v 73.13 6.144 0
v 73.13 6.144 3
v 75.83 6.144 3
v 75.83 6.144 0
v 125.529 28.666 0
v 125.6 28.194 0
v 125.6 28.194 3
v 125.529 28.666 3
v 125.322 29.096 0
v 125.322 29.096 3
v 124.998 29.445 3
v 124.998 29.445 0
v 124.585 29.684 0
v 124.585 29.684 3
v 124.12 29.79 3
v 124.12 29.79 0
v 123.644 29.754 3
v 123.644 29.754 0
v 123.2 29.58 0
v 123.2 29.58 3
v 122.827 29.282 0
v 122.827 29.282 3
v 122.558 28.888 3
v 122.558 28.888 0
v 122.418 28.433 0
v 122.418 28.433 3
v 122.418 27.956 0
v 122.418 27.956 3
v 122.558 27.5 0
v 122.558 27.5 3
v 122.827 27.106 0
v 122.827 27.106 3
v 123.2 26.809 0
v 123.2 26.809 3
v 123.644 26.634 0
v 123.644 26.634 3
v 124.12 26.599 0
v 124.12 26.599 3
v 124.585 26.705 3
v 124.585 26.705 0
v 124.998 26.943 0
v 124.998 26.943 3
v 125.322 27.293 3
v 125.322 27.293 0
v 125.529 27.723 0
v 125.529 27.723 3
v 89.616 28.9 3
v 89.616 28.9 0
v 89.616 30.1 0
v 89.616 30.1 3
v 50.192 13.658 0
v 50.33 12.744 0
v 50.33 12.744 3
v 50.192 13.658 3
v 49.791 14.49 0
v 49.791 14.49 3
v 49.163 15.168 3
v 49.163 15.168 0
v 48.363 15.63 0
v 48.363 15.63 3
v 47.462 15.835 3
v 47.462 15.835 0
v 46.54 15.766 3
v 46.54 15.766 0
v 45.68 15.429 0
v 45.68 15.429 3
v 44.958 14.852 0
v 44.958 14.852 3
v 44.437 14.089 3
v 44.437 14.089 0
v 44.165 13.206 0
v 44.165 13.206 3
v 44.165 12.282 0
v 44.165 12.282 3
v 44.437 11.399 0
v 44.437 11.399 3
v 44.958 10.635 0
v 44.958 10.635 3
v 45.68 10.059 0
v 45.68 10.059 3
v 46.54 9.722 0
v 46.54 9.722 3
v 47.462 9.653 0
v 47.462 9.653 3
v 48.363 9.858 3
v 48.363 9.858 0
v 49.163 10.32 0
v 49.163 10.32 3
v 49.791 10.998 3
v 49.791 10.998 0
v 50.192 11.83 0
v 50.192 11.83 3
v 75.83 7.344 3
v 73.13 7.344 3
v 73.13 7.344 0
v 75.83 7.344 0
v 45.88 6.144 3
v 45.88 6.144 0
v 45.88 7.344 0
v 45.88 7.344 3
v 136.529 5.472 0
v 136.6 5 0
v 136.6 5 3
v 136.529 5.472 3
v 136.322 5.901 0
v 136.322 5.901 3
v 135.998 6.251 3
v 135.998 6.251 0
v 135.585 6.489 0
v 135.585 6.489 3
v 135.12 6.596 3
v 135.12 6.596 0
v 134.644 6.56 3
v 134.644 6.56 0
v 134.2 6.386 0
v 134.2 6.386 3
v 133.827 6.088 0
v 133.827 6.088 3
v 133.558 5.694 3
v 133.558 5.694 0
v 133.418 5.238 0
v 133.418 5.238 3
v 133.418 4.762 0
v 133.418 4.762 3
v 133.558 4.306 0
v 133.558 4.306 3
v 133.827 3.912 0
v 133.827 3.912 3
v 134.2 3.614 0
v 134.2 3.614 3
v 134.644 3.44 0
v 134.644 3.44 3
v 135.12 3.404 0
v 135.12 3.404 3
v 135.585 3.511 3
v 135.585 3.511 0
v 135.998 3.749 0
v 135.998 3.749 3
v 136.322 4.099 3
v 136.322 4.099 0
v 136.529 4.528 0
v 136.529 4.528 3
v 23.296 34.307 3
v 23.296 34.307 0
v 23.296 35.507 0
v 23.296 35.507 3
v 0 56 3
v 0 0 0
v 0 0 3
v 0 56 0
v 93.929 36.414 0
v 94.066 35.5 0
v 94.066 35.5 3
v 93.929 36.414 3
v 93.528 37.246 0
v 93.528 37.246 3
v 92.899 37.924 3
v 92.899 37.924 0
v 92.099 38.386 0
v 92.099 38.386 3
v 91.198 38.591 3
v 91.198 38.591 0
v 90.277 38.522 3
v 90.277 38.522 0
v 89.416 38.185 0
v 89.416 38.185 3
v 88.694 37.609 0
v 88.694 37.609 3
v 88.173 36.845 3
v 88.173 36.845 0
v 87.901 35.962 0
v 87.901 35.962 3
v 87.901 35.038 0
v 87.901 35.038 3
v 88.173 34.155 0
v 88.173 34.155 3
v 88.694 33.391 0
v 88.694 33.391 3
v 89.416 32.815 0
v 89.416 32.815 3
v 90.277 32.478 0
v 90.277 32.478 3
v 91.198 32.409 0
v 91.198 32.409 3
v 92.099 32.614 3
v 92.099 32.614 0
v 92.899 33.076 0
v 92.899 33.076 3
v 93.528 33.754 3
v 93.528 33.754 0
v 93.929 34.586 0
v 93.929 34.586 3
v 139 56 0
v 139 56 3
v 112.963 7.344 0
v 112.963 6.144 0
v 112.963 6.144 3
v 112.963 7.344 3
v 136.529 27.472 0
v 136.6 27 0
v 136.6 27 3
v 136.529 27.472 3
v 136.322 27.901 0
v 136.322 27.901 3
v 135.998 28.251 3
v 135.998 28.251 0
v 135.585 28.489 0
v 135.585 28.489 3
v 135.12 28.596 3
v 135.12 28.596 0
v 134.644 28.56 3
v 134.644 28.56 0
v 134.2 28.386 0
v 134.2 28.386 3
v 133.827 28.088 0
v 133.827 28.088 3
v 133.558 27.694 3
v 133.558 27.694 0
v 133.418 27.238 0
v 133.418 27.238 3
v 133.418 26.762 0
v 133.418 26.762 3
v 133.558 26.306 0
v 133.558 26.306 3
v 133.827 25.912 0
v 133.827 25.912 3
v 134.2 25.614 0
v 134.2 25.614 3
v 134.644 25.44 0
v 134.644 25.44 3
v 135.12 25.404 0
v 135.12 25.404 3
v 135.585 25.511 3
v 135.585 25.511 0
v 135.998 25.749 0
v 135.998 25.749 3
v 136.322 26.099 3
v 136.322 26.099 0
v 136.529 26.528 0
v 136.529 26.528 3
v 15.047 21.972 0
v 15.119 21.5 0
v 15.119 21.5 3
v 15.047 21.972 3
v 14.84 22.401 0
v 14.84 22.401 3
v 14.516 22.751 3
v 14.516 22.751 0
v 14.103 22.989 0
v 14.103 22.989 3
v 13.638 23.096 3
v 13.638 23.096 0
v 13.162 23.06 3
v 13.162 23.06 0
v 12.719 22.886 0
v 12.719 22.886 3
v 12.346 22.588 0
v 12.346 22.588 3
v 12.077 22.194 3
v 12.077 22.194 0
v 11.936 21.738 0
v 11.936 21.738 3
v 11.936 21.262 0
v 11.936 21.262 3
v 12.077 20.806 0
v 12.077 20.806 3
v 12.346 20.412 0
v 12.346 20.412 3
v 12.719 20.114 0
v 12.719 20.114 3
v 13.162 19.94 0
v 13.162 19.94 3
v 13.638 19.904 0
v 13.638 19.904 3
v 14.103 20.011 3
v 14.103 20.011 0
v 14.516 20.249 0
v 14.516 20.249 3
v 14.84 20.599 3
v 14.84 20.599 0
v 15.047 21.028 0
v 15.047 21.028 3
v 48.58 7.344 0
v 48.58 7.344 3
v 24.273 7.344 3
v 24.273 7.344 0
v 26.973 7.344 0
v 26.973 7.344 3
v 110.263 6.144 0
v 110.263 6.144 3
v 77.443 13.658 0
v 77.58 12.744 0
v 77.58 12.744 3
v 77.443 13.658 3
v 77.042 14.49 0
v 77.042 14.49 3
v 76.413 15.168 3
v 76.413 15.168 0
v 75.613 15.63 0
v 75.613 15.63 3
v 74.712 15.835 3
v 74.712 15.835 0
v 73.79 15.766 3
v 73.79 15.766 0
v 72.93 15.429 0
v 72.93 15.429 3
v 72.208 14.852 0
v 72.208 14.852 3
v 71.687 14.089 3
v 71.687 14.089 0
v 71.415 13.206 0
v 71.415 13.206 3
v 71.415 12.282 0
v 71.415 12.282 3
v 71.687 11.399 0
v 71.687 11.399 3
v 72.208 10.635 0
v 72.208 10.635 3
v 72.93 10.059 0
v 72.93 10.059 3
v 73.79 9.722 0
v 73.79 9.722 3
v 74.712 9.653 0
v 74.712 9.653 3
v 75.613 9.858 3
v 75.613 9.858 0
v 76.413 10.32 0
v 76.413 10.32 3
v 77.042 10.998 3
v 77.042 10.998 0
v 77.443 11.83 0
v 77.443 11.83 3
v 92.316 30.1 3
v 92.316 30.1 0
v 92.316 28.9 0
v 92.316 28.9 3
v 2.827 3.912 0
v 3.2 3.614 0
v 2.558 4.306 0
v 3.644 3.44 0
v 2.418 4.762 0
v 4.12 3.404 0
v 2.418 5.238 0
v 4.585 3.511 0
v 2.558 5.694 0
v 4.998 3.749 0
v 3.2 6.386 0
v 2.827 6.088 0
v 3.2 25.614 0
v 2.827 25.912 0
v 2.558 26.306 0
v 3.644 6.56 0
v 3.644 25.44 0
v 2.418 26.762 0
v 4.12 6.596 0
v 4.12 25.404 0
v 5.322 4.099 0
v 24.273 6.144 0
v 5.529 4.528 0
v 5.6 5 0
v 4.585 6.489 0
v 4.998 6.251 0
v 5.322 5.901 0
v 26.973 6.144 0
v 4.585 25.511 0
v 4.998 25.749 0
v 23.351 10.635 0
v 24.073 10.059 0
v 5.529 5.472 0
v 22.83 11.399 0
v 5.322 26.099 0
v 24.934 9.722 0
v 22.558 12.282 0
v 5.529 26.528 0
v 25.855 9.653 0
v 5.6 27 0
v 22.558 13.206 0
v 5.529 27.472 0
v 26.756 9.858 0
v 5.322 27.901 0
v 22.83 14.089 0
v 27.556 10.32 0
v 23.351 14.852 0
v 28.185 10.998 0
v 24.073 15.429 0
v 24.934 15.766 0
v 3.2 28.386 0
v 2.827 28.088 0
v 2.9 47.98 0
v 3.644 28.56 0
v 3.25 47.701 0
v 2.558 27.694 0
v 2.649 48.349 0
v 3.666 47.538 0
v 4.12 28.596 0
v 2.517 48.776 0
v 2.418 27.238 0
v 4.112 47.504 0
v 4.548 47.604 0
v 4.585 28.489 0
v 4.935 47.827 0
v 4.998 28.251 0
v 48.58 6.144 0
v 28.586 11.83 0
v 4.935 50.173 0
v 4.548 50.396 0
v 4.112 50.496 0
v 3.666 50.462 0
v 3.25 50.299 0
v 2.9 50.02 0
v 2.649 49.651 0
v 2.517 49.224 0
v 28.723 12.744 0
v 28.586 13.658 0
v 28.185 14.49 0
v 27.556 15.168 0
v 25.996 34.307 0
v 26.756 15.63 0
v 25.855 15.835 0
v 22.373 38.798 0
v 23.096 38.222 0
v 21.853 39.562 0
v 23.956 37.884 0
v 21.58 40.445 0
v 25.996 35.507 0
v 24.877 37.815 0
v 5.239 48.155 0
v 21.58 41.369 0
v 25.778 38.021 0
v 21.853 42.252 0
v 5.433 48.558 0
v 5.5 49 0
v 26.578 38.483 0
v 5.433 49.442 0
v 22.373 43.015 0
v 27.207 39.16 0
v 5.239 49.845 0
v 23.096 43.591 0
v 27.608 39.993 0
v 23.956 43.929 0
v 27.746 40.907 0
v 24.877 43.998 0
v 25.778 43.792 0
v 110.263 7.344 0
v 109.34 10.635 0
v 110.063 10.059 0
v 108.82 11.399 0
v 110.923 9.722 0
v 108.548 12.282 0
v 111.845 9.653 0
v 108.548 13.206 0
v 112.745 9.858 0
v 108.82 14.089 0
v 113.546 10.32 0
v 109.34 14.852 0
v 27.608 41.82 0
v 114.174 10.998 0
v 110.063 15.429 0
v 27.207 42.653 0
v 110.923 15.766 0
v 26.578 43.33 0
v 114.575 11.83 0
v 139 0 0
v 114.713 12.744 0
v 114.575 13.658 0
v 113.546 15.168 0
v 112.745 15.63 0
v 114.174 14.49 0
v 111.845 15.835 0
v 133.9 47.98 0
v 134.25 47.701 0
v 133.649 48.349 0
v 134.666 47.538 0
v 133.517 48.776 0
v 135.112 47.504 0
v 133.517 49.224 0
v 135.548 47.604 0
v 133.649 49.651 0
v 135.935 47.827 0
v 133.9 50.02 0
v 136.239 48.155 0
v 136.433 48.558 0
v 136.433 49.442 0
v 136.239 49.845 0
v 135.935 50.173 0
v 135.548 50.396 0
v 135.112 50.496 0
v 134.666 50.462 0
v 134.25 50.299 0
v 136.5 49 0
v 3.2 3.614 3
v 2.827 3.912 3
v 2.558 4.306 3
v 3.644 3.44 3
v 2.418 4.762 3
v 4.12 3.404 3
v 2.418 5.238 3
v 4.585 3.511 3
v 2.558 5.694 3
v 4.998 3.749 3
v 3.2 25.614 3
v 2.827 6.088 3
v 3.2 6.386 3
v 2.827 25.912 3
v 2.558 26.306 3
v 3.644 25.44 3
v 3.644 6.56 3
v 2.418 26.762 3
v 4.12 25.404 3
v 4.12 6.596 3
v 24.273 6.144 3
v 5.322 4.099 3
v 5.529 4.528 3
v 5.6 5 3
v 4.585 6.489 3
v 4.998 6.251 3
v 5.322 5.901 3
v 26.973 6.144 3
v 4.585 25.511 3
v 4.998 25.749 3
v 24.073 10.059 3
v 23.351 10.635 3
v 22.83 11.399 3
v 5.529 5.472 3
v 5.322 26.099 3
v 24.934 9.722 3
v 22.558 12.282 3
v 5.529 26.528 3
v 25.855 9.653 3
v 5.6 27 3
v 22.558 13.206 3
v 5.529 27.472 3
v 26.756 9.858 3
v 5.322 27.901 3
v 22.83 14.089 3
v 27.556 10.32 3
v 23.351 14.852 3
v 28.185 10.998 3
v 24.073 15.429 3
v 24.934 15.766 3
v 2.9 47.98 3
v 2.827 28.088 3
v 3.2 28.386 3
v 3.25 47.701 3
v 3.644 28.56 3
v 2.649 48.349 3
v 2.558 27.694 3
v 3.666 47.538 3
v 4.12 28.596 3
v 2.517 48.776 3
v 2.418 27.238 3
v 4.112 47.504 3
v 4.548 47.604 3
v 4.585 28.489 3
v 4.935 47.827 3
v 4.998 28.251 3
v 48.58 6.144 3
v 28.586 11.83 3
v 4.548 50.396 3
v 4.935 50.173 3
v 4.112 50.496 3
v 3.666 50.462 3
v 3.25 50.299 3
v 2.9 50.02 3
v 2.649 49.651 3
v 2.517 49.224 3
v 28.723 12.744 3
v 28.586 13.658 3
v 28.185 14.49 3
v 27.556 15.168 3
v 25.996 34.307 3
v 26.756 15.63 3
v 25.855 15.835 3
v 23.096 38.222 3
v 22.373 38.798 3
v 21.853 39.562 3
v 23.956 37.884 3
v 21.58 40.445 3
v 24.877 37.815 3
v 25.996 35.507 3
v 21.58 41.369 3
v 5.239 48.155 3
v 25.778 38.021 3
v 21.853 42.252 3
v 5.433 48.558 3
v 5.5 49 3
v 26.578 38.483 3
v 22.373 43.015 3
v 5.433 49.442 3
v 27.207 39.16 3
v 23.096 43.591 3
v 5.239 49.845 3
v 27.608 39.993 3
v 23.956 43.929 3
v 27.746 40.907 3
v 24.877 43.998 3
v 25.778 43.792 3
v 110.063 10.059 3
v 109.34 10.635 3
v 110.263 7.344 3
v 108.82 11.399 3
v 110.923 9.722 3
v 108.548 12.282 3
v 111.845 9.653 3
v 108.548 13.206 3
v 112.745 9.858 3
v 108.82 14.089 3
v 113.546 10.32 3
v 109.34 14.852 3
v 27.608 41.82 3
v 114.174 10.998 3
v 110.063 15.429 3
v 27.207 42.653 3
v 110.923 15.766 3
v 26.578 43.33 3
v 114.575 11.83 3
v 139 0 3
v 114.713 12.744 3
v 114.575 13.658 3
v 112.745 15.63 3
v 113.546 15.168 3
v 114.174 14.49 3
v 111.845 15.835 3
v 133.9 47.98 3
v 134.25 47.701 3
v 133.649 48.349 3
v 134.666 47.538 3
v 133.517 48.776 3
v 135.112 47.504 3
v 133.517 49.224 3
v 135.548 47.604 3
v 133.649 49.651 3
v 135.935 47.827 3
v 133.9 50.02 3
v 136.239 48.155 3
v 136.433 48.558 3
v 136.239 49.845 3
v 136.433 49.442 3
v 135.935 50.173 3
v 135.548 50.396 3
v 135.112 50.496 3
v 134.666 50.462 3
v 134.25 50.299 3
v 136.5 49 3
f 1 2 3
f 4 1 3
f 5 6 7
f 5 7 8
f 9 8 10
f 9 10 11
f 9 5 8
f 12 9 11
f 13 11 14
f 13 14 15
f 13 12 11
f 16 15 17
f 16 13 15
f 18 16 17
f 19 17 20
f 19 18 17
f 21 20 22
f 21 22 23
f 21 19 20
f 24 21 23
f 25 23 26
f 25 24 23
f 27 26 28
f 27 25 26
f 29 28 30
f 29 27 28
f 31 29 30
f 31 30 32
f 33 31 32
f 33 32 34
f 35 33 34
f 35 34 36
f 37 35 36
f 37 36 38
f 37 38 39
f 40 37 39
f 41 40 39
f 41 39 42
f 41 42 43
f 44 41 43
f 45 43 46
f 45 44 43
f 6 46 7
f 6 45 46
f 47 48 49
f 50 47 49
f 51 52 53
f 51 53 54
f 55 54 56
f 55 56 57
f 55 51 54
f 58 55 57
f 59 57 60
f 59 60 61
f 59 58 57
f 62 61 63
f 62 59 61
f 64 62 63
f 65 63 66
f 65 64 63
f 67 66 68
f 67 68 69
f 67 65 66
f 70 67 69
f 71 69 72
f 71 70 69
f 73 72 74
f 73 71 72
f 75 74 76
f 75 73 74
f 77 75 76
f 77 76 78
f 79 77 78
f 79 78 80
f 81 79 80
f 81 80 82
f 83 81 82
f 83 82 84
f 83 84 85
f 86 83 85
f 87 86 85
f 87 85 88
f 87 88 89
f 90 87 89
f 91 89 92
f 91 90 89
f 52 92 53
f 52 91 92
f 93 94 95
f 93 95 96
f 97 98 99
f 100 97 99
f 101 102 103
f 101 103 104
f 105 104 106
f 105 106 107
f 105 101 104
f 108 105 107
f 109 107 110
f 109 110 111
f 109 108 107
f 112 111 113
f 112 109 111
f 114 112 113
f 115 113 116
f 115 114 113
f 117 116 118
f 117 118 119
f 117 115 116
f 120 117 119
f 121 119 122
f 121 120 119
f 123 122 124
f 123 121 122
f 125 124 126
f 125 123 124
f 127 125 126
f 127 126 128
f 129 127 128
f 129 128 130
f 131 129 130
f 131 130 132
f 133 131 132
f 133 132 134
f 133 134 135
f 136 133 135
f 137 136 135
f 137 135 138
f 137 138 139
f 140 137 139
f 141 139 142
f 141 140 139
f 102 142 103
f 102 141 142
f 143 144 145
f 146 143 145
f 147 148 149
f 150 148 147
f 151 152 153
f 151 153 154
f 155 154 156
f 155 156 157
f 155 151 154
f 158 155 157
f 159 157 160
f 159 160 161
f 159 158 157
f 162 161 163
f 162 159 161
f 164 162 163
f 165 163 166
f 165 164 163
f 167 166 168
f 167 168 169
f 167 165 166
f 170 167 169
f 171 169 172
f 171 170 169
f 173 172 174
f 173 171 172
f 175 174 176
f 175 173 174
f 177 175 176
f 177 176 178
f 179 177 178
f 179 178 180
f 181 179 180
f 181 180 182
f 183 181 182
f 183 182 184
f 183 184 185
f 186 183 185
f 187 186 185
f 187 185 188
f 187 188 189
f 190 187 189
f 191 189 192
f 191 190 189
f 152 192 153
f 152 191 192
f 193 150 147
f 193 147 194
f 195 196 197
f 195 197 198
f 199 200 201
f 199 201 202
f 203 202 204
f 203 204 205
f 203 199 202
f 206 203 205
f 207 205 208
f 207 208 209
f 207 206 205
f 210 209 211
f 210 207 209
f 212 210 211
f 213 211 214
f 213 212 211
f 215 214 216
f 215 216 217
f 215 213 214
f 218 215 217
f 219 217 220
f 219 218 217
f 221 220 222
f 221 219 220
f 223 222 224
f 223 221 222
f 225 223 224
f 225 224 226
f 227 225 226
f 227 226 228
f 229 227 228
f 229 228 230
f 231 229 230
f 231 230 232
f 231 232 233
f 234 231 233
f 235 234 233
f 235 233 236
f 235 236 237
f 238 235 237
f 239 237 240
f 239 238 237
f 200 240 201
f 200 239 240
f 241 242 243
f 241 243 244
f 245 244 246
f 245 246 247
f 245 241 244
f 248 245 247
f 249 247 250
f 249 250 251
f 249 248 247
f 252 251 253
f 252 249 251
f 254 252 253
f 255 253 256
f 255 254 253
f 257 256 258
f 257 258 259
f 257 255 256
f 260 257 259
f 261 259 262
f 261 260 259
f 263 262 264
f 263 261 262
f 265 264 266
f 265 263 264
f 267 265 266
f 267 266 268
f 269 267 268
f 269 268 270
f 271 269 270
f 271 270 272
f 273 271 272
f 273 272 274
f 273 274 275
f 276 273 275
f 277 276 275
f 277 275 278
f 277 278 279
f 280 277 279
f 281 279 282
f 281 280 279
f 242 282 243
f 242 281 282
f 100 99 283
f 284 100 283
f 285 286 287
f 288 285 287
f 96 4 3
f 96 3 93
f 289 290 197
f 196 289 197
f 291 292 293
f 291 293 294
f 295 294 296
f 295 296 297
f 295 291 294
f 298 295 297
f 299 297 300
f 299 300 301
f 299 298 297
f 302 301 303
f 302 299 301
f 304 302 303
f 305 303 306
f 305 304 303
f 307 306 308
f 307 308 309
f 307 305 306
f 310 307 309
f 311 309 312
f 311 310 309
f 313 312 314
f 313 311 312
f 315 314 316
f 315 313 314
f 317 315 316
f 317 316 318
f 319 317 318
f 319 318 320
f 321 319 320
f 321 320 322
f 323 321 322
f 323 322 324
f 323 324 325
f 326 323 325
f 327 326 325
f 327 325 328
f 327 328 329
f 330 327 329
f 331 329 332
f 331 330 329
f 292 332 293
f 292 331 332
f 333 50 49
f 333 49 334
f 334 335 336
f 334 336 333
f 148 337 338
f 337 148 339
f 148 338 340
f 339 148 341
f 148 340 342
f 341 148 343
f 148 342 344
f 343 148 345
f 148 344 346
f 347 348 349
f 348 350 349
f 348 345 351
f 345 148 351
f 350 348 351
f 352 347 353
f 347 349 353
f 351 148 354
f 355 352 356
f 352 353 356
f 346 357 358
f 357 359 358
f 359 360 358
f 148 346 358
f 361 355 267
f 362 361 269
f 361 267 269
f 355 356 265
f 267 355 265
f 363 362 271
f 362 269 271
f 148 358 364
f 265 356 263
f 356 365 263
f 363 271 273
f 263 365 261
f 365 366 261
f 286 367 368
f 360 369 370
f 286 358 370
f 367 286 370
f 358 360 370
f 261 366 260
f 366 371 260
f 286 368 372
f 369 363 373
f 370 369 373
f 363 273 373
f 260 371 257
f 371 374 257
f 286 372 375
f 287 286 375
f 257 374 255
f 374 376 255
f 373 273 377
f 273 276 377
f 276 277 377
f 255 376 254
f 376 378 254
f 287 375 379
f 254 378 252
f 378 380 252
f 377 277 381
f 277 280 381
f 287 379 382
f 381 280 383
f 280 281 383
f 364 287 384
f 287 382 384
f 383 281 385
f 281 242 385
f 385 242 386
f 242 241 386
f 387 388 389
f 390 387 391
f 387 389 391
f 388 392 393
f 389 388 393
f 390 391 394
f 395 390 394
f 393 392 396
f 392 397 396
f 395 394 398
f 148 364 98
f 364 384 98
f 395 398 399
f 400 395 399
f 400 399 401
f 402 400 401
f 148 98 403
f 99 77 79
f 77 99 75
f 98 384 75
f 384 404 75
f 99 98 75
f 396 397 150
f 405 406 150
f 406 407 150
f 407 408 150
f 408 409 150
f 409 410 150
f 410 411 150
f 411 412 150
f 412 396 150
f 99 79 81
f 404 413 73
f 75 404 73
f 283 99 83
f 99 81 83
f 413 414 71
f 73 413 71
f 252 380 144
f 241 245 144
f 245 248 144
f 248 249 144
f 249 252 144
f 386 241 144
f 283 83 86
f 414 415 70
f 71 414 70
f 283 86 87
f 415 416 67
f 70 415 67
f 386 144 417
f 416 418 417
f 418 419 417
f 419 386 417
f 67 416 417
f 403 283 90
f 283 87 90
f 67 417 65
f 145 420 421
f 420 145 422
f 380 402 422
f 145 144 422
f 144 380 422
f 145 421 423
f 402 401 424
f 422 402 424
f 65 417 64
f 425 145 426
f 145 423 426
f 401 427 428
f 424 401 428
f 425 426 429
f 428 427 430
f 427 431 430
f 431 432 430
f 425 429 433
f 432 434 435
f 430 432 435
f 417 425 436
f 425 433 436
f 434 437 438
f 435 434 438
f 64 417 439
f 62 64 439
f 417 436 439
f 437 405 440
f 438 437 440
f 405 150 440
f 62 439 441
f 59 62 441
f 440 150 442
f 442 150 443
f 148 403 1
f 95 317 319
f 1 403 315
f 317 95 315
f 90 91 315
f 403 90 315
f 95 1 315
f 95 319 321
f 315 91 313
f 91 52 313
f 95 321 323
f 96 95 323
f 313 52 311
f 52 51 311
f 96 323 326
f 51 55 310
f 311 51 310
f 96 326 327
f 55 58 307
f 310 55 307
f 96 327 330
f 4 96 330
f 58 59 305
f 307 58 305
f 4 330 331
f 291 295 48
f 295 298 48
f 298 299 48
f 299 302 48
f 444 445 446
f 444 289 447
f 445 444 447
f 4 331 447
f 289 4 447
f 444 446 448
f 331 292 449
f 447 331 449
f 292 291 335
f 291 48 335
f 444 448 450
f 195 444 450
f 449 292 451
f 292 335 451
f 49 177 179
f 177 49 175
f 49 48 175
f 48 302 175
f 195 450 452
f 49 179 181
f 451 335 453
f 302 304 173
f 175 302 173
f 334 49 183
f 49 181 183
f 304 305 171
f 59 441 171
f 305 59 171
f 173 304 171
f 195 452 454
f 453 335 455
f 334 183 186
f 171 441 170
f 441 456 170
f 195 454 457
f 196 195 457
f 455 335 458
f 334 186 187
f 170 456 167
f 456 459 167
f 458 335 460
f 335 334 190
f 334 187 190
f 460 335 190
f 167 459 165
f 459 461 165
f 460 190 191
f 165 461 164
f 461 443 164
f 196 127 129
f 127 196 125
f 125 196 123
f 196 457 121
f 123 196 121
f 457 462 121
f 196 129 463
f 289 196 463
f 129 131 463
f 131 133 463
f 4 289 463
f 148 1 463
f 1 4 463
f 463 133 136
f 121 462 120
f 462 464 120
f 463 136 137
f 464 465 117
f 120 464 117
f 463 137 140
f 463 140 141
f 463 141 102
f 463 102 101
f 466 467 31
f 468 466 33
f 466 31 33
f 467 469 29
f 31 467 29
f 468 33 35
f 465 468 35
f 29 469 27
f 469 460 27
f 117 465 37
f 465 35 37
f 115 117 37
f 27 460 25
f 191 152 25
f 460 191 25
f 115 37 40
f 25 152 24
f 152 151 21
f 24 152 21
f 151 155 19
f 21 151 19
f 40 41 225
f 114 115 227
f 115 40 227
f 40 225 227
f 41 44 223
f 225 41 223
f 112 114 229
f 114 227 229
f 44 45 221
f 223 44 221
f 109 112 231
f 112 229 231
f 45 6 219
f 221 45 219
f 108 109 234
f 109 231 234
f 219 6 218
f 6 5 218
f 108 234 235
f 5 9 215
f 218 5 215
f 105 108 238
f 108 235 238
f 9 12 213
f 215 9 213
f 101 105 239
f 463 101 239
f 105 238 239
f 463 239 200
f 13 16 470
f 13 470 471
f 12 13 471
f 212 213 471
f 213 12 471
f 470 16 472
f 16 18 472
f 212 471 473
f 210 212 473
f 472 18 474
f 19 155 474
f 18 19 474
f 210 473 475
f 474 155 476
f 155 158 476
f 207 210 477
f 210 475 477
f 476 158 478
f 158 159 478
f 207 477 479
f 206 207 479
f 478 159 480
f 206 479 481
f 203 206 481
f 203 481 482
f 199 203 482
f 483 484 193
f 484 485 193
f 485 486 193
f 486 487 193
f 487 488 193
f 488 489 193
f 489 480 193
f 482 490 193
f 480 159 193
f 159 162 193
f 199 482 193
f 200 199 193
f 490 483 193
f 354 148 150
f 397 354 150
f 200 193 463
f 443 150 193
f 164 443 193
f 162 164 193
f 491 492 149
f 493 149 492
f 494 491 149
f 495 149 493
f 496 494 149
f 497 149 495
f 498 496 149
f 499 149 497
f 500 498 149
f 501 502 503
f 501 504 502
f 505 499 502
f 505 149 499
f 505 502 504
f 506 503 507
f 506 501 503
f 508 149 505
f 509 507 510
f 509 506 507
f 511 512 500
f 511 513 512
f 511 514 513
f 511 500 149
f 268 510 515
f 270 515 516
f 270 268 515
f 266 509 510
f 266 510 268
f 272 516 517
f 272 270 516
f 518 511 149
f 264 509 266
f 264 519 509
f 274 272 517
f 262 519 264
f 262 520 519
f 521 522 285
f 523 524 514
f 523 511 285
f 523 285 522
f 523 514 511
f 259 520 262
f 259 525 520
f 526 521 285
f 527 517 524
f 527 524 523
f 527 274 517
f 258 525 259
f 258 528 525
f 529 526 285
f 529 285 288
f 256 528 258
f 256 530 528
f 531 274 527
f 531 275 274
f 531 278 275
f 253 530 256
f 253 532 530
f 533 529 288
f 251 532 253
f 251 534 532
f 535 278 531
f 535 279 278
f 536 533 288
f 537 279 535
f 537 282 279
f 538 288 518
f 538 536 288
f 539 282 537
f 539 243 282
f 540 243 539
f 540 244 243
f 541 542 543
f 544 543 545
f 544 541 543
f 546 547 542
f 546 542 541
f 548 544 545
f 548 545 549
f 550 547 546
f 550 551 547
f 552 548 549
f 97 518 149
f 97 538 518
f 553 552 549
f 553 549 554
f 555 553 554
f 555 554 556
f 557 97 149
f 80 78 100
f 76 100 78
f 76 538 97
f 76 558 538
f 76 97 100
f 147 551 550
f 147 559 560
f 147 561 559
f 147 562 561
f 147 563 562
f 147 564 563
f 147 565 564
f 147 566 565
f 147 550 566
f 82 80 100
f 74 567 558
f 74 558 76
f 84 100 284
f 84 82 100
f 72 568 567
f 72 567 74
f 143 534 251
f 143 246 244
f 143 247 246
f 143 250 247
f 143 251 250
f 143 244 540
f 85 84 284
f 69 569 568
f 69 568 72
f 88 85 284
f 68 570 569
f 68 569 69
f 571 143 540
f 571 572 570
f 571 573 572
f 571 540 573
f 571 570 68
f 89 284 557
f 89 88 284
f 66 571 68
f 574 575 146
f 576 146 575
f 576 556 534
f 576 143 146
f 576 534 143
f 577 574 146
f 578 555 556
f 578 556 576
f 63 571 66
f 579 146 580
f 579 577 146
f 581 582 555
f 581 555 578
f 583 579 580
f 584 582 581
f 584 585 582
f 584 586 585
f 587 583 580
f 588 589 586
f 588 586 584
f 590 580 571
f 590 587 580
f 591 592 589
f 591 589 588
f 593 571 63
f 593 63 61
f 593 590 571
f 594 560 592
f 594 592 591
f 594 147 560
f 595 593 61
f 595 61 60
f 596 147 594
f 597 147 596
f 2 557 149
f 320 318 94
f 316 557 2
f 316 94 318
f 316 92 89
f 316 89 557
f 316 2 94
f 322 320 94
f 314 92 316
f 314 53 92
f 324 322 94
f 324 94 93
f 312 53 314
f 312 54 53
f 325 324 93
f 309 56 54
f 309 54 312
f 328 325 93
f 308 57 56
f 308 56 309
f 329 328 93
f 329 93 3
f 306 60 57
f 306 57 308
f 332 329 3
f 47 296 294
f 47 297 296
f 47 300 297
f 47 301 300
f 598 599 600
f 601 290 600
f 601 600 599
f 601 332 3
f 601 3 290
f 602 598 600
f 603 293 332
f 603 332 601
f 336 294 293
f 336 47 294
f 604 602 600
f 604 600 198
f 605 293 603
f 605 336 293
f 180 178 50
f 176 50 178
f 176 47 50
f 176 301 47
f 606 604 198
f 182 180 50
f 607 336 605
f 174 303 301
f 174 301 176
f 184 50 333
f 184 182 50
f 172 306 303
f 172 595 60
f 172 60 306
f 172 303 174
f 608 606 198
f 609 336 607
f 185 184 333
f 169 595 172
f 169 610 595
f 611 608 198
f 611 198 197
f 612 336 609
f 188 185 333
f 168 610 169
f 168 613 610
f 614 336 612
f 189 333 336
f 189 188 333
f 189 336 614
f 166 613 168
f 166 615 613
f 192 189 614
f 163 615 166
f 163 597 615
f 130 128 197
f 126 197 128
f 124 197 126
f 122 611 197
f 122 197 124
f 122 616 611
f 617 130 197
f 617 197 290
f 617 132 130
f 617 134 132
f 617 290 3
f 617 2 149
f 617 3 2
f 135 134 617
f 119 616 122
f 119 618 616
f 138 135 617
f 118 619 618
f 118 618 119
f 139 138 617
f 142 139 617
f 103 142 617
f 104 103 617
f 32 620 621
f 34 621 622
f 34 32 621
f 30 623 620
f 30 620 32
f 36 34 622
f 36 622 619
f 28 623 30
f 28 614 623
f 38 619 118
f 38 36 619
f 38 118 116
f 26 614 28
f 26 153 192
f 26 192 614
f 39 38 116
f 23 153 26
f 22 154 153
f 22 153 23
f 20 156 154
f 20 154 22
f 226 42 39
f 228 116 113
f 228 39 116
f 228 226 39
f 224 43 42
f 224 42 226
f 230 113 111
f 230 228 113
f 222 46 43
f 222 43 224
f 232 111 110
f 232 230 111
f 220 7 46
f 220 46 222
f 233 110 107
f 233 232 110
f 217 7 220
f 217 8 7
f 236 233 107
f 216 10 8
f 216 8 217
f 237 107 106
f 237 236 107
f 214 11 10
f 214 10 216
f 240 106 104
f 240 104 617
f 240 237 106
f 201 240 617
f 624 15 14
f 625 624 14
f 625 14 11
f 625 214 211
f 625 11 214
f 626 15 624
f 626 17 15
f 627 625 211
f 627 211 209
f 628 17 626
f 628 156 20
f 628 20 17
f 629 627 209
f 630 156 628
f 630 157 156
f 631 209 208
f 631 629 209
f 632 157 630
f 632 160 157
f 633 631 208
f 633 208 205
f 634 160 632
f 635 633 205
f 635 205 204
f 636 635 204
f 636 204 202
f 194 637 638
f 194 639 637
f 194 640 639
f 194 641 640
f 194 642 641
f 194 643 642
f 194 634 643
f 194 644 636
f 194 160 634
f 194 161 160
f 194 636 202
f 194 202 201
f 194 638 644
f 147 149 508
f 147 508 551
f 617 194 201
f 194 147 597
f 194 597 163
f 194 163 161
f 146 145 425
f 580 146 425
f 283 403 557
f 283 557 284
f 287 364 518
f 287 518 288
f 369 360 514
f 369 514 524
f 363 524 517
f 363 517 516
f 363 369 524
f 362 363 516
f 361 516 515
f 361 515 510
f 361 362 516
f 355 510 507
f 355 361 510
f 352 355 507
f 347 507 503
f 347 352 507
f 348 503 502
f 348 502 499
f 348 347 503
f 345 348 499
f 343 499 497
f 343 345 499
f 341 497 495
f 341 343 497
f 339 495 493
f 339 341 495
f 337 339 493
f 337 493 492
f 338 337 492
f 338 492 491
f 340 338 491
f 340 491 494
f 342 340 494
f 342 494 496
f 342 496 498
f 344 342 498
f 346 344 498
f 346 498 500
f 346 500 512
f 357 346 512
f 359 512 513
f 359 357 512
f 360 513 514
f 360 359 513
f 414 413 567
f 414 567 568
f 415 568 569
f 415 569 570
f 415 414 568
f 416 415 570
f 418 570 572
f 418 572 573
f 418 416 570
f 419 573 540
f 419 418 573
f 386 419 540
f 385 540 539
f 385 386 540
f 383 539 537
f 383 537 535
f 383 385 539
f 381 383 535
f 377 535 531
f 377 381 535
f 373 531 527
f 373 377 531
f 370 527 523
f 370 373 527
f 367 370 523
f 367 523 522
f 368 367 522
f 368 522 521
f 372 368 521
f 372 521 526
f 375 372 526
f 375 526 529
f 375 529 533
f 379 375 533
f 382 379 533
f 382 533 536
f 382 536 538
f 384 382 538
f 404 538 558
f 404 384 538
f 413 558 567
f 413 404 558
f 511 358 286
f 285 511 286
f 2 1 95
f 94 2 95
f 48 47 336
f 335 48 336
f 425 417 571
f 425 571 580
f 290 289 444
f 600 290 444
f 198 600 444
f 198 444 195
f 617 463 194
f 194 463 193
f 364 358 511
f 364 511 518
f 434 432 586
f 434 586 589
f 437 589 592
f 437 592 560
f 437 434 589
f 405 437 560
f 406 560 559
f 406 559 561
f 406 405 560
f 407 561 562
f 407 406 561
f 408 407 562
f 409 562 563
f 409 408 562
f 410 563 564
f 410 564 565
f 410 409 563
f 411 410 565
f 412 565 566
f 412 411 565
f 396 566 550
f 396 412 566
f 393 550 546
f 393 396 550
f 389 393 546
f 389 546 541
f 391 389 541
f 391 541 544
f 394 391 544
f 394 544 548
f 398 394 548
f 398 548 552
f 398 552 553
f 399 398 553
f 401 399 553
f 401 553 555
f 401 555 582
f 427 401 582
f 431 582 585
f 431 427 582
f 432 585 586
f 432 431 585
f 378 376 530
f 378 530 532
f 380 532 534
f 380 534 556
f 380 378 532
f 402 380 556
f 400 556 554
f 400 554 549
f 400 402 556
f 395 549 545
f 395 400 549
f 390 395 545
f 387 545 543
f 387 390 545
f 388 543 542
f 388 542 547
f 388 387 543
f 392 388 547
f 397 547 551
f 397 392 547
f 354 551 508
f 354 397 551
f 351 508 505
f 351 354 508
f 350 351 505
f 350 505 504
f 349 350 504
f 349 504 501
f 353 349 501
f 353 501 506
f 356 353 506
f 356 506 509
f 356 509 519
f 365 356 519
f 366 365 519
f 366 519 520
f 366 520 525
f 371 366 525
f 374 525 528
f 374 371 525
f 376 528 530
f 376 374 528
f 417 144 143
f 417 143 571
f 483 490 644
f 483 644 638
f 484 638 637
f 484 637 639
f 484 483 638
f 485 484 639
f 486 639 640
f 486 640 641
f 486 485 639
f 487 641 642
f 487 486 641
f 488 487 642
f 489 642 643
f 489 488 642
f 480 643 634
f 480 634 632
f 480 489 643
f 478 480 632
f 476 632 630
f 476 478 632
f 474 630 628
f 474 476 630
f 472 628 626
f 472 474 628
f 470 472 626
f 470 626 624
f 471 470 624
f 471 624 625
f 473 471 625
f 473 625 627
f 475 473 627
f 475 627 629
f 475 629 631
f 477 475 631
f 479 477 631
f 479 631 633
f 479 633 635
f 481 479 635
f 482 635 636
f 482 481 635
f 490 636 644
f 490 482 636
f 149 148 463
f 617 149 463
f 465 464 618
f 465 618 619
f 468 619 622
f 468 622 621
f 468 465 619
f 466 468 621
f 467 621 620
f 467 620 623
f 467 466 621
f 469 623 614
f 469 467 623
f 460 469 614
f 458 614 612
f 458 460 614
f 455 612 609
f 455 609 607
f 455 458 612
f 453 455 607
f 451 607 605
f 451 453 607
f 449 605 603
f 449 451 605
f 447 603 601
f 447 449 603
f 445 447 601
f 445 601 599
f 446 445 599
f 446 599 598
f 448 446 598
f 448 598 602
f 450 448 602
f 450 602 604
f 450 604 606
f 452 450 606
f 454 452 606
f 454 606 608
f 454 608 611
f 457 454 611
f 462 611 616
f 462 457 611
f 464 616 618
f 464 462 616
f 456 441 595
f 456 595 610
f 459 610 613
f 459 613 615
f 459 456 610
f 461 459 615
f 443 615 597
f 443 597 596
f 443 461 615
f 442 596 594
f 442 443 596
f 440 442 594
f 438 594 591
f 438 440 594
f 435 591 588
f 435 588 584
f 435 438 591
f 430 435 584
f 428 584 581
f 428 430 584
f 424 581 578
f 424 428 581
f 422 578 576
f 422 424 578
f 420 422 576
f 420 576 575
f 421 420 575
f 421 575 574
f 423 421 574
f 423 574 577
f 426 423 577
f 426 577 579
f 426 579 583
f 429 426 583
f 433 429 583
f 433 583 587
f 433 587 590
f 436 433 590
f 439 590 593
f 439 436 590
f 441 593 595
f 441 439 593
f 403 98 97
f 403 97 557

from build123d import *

# Parameters (mm, degrees)
SKETCH1_W           = 139
SKETCH1_H           = 56
SKETCH1_R           = 1.6
SKETCH1_R_2         = 3.1
SKETCH1_R_3         = 1.5
SKETCH1_W_2         = 2.7
SKETCH1_H_2         = 1.2
BOSS_EXTRUDE1_DEPTH = 3


with BuildPart() as part:
    # Sketch1 → Boss-Extrude1 (new body)
    with BuildSketch(Plane.XY):
        with Locations((69.5, 28)):
            Rectangle(SKETCH1_W, SKETCH1_H)
        with Locations((4, 27)):
            Circle(SKETCH1_R, mode=Mode.SUBTRACT)
        with Locations((135, 27)):
            Circle(SKETCH1_R, mode=Mode.SUBTRACT)
        with Locations((135, 5)):
            Circle(SKETCH1_R, mode=Mode.SUBTRACT)
        with Locations((4, 5)):
            Circle(SKETCH1_R, mode=Mode.SUBTRACT)
        with Locations((13.518505835, 21.5)):
            Circle(SKETCH1_R, mode=Mode.SUBTRACT)
        with Locations((124, 28.19419762)):
            Circle(SKETCH1_R, mode=Mode.SUBTRACT)
        with Locations((24.645602403, 40.906620861)):
            Circle(SKETCH1_R_2, mode=Mode.SUBTRACT)
        with Locations((25.62333913, 12.743937624)):
            Circle(SKETCH1_R_2, mode=Mode.SUBTRACT)
        with Locations((111.612884483, 12.743937624)):
            Circle(SKETCH1_R_2, mode=Mode.SUBTRACT)
        with Locations((90.966366944, 35.5)):
            Circle(SKETCH1_R_2, mode=Mode.SUBTRACT)
        with Locations((74.480236578, 12.743937624)):
            Circle(SKETCH1_R_2, mode=Mode.SUBTRACT)
        with Locations((47.230023053, 12.743937624)):
            Circle(SKETCH1_R_2, mode=Mode.SUBTRACT)
        with Locations((4, 49)):
            Circle(SKETCH1_R_3, mode=Mode.SUBTRACT)
        with Locations((135, 49)):
            Circle(SKETCH1_R_3, mode=Mode.SUBTRACT)
        with Locations((24.645602403, 34.906620861)):
            Rectangle(SKETCH1_W_2, SKETCH1_H_2, mode=Mode.SUBTRACT)
        with Locations((25.62333913, 6.743937624)):
            Rectangle(SKETCH1_W_2, SKETCH1_H_2, mode=Mode.SUBTRACT)
        with Locations((111.612884483, 6.743937624)):
            Rectangle(SKETCH1_W_2, SKETCH1_H_2, mode=Mode.SUBTRACT)
        with Locations((90.966366944, 29.5)):
            Rectangle(SKETCH1_W_2, SKETCH1_H_2, mode=Mode.SUBTRACT)
        with Locations((74.480236578, 6.743937624)):
            Rectangle(SKETCH1_W_2, SKETCH1_H_2, mode=Mode.SUBTRACT)
        with Locations((47.230023053, 6.743937624)):
            Rectangle(SKETCH1_W_2, SKETCH1_H_2, mode=Mode.SUBTRACT)
    extrude(amount=BOSS_EXTRUDE1_DEPTH)


solid = part.part
